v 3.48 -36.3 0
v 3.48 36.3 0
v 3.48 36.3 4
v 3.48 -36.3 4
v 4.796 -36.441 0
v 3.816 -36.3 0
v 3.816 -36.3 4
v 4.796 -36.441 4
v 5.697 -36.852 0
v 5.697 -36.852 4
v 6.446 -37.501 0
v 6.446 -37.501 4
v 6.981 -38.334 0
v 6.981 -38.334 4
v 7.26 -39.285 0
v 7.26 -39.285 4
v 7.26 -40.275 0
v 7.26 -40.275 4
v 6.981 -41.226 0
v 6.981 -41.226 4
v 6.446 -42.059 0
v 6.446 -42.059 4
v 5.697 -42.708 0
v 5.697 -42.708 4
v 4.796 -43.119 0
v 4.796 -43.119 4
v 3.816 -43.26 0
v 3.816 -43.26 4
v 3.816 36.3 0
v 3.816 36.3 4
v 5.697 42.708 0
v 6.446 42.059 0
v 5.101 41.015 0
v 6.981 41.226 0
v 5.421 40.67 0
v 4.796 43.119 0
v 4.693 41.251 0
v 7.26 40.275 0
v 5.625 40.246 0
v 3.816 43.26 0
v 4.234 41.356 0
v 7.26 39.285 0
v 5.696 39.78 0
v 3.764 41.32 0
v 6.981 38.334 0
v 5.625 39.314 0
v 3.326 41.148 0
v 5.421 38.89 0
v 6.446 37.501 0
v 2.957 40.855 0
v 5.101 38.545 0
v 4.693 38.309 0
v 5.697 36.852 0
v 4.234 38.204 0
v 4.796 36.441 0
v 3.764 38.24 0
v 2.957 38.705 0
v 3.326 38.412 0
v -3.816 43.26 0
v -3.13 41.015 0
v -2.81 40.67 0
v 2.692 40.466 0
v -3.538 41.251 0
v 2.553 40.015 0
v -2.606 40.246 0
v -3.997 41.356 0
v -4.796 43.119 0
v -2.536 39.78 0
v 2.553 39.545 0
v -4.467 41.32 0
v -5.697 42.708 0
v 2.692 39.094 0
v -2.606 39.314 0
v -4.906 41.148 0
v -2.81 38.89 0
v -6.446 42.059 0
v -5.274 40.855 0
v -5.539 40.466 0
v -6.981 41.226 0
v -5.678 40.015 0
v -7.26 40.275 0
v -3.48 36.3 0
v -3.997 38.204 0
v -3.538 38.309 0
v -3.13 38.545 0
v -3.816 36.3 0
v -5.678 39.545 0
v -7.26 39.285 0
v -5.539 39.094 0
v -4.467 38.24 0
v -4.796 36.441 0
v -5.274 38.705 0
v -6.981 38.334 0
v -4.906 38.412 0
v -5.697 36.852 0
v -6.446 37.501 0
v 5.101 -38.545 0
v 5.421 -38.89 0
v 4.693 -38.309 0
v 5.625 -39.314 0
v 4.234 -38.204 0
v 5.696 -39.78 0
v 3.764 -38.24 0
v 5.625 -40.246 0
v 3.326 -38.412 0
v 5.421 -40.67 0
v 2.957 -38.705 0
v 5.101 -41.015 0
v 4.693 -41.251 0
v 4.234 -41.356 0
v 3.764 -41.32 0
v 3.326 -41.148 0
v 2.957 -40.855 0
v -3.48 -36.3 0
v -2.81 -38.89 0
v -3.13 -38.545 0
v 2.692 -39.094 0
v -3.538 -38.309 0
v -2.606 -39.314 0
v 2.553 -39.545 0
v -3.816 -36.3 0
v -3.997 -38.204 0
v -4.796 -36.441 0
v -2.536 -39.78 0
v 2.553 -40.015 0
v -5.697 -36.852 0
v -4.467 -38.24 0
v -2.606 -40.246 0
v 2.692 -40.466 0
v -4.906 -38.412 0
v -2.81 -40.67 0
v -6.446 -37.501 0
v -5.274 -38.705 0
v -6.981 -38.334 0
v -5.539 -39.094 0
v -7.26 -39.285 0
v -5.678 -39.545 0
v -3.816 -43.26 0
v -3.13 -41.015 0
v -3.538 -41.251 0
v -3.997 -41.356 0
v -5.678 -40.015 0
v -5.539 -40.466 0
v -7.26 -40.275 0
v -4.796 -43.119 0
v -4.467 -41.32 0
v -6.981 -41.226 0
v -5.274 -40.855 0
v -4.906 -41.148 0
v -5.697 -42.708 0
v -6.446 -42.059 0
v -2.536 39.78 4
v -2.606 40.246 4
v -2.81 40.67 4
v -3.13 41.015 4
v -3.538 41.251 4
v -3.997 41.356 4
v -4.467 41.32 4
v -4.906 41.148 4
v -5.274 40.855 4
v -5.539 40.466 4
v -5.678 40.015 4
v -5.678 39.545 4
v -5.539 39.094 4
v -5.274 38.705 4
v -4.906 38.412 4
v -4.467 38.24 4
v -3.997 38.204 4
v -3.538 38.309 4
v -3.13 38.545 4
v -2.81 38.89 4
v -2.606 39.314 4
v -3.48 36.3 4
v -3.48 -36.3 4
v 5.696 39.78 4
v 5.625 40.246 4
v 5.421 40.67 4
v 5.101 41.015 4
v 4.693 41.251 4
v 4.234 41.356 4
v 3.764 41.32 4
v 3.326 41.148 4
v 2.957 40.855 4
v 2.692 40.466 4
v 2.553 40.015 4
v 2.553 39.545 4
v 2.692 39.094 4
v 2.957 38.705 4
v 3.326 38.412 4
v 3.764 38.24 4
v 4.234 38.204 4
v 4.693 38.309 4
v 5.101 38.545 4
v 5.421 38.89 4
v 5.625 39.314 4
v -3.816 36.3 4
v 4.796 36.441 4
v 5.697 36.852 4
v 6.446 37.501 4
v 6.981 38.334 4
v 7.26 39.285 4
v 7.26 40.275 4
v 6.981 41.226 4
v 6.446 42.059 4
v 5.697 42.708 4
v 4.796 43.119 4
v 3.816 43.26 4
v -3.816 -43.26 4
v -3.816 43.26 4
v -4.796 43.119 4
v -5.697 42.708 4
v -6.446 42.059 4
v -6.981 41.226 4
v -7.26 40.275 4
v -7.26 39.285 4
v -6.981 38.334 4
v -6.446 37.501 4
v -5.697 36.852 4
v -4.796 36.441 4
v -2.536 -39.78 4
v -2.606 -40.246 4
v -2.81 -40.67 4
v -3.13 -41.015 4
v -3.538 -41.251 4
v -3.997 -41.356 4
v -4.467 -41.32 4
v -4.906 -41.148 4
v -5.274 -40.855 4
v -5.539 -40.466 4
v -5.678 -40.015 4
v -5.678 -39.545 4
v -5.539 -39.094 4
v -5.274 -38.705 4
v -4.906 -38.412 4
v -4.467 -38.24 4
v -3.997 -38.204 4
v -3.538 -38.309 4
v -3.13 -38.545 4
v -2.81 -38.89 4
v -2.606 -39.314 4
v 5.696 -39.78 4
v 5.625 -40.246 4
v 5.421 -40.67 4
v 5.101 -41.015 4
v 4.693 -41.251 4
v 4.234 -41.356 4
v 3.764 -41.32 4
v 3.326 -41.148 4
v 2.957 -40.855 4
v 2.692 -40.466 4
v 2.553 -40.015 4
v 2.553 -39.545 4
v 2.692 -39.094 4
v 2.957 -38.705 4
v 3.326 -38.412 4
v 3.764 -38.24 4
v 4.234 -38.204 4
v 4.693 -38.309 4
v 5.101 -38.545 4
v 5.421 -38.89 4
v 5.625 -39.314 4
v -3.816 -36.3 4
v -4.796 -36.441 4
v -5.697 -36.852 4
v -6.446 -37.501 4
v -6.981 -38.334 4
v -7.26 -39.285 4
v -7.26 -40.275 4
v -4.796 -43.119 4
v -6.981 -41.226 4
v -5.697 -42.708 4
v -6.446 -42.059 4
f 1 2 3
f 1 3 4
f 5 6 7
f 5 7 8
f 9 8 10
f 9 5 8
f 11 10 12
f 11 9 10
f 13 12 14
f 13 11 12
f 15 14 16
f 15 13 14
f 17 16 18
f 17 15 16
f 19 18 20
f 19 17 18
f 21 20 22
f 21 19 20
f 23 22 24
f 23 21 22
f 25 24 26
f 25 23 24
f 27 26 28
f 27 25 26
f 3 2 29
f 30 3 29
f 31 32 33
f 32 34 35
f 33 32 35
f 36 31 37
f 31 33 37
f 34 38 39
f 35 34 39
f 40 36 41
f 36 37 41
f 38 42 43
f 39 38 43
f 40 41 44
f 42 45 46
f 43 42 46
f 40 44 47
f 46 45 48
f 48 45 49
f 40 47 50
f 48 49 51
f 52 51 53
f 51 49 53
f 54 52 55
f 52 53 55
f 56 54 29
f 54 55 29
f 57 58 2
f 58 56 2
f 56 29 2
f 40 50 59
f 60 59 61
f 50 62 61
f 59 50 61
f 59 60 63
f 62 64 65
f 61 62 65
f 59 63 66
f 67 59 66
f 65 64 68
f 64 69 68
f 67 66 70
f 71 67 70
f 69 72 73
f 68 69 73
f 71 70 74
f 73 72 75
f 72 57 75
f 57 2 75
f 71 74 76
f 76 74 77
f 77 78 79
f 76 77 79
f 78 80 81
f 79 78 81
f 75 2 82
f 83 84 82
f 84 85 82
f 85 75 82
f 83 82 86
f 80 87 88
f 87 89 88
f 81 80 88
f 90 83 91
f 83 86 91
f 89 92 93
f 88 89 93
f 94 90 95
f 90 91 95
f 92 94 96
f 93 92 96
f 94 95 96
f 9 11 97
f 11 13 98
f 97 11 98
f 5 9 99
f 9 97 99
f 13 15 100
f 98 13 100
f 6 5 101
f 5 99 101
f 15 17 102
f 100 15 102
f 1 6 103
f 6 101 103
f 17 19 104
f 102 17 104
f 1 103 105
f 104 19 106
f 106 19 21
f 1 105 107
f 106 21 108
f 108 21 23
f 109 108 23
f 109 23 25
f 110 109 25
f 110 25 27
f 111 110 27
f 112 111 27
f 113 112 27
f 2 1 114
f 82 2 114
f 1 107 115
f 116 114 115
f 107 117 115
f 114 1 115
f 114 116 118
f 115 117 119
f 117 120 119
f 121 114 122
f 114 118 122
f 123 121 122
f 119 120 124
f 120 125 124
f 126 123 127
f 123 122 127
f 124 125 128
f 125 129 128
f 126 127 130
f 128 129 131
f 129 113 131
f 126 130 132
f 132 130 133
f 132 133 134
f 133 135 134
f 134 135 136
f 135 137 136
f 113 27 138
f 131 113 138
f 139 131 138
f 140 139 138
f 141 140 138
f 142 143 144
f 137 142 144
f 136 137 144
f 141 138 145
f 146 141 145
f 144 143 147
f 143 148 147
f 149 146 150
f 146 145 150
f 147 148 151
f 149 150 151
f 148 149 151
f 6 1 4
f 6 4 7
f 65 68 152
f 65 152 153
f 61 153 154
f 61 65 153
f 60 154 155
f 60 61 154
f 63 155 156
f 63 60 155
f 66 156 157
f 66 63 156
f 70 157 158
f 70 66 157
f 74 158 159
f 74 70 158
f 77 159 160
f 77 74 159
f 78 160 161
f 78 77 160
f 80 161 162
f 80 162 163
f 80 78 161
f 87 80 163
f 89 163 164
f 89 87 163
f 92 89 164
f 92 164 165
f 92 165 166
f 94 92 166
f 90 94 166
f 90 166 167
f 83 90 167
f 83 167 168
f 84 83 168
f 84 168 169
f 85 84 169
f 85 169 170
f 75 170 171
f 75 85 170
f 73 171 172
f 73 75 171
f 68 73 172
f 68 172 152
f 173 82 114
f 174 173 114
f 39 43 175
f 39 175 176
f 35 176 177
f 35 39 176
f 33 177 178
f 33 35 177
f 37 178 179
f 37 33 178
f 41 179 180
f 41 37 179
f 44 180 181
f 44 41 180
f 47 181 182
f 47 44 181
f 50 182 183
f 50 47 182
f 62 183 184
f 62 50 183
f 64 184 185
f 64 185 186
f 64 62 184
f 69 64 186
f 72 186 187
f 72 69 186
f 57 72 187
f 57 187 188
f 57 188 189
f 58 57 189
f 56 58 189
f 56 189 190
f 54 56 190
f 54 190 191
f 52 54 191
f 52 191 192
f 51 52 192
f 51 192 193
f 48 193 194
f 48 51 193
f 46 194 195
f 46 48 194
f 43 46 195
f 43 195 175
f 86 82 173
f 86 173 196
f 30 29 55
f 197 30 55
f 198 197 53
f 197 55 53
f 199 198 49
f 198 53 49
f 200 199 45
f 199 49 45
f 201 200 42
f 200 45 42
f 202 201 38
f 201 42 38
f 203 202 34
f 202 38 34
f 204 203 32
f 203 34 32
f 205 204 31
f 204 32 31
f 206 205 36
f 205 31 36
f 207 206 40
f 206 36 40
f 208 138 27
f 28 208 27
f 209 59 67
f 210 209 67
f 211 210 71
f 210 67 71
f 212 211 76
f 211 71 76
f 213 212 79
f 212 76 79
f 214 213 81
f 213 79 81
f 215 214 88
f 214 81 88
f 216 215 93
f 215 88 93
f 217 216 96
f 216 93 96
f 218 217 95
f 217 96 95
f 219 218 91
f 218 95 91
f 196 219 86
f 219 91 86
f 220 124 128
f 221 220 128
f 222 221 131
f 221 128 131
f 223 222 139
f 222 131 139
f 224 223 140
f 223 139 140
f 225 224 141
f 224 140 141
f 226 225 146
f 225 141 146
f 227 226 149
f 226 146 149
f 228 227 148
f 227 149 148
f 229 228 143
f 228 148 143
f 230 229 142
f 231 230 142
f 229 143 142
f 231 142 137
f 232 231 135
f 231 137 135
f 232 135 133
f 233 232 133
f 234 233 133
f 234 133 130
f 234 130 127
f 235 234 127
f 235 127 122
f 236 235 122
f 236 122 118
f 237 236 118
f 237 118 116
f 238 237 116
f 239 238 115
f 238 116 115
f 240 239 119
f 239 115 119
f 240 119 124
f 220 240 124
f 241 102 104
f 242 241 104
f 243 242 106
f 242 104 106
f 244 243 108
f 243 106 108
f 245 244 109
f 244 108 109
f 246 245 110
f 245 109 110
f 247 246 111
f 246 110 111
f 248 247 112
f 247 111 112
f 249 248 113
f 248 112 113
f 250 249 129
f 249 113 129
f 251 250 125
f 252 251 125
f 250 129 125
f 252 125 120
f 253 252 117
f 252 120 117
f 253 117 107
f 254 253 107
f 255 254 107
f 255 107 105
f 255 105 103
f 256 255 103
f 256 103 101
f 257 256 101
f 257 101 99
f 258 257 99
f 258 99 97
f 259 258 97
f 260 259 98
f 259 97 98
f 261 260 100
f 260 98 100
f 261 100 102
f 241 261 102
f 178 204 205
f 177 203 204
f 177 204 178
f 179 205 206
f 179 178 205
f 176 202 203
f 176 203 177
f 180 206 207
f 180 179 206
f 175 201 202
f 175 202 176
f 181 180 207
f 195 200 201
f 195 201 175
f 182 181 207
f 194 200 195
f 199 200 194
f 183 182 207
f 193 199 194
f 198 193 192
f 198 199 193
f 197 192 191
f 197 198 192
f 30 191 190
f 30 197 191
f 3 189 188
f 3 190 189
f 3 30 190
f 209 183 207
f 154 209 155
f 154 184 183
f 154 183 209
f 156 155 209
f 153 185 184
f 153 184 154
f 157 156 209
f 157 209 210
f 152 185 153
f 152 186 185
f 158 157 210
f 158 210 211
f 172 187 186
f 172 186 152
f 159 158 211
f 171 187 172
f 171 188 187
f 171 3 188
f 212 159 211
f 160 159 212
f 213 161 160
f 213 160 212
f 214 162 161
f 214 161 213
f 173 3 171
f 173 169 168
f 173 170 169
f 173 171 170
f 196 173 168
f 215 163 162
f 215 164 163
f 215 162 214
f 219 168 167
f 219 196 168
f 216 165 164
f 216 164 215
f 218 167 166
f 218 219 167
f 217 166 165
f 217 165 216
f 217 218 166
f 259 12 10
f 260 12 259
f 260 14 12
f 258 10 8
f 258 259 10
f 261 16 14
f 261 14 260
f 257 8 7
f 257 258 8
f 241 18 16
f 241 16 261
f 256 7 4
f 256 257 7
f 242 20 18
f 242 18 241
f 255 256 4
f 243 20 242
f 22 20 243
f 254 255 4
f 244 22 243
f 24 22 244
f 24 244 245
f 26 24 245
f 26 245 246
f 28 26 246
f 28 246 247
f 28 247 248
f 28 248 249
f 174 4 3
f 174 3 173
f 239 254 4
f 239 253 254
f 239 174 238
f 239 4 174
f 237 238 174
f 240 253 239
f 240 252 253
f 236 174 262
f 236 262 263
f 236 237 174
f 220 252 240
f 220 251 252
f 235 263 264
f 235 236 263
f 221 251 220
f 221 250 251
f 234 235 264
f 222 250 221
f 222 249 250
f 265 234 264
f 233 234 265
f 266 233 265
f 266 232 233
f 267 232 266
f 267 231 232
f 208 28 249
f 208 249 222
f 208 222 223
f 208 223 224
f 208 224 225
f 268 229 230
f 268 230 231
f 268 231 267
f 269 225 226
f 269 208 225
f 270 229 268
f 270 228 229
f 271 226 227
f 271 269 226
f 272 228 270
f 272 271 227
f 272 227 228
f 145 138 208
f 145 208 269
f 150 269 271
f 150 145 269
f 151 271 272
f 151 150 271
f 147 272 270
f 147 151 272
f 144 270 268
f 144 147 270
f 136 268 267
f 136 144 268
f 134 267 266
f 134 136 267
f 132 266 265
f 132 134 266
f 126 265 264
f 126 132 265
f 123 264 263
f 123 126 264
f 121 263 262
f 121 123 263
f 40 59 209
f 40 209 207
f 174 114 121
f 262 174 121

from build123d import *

# Parameters (mm, degrees)
SKETCH_R  = 1.58
PAD_DEPTH = 4


with BuildPart() as part:
    # Sketch → Pad (new body)
    with BuildSketch(Plane.XY):
        with BuildLine():
            Line((-3.48, 0), (-3.48, 36.3))
            Line((-3.48, 36.3), (-3.81555, 36.3))
            ThreePointArc((-3.81555, 43.26), (-7.29555, 39.78), (-3.81555, 36.3))
            Line((-3.81555, 43.26), (3.81555, 43.26))
            ThreePointArc((3.81555, 36.3), (7.29555, 39.78), (3.81555, 43.26))
            Line((3.48, 36.3), (3.81555, 36.3))
            Line((3.48, 0), (3.48, 36.3))
            Line((-3.48, 0), (3.48, 0))
        make_face()
        with Locations((-4.11555, 39.78)):
            Circle(SKETCH_R, mode=Mode.SUBTRACT)
        with Locations((4.11555, 39.78)):
            Circle(SKETCH_R, mode=Mode.SUBTRACT)
    pad = extrude(amount=PAD_DEPTH)

    # Mirrored: Pad across Sketch H_Axis
    add(pad.mirror(Plane.ZX))


solid = part.part
